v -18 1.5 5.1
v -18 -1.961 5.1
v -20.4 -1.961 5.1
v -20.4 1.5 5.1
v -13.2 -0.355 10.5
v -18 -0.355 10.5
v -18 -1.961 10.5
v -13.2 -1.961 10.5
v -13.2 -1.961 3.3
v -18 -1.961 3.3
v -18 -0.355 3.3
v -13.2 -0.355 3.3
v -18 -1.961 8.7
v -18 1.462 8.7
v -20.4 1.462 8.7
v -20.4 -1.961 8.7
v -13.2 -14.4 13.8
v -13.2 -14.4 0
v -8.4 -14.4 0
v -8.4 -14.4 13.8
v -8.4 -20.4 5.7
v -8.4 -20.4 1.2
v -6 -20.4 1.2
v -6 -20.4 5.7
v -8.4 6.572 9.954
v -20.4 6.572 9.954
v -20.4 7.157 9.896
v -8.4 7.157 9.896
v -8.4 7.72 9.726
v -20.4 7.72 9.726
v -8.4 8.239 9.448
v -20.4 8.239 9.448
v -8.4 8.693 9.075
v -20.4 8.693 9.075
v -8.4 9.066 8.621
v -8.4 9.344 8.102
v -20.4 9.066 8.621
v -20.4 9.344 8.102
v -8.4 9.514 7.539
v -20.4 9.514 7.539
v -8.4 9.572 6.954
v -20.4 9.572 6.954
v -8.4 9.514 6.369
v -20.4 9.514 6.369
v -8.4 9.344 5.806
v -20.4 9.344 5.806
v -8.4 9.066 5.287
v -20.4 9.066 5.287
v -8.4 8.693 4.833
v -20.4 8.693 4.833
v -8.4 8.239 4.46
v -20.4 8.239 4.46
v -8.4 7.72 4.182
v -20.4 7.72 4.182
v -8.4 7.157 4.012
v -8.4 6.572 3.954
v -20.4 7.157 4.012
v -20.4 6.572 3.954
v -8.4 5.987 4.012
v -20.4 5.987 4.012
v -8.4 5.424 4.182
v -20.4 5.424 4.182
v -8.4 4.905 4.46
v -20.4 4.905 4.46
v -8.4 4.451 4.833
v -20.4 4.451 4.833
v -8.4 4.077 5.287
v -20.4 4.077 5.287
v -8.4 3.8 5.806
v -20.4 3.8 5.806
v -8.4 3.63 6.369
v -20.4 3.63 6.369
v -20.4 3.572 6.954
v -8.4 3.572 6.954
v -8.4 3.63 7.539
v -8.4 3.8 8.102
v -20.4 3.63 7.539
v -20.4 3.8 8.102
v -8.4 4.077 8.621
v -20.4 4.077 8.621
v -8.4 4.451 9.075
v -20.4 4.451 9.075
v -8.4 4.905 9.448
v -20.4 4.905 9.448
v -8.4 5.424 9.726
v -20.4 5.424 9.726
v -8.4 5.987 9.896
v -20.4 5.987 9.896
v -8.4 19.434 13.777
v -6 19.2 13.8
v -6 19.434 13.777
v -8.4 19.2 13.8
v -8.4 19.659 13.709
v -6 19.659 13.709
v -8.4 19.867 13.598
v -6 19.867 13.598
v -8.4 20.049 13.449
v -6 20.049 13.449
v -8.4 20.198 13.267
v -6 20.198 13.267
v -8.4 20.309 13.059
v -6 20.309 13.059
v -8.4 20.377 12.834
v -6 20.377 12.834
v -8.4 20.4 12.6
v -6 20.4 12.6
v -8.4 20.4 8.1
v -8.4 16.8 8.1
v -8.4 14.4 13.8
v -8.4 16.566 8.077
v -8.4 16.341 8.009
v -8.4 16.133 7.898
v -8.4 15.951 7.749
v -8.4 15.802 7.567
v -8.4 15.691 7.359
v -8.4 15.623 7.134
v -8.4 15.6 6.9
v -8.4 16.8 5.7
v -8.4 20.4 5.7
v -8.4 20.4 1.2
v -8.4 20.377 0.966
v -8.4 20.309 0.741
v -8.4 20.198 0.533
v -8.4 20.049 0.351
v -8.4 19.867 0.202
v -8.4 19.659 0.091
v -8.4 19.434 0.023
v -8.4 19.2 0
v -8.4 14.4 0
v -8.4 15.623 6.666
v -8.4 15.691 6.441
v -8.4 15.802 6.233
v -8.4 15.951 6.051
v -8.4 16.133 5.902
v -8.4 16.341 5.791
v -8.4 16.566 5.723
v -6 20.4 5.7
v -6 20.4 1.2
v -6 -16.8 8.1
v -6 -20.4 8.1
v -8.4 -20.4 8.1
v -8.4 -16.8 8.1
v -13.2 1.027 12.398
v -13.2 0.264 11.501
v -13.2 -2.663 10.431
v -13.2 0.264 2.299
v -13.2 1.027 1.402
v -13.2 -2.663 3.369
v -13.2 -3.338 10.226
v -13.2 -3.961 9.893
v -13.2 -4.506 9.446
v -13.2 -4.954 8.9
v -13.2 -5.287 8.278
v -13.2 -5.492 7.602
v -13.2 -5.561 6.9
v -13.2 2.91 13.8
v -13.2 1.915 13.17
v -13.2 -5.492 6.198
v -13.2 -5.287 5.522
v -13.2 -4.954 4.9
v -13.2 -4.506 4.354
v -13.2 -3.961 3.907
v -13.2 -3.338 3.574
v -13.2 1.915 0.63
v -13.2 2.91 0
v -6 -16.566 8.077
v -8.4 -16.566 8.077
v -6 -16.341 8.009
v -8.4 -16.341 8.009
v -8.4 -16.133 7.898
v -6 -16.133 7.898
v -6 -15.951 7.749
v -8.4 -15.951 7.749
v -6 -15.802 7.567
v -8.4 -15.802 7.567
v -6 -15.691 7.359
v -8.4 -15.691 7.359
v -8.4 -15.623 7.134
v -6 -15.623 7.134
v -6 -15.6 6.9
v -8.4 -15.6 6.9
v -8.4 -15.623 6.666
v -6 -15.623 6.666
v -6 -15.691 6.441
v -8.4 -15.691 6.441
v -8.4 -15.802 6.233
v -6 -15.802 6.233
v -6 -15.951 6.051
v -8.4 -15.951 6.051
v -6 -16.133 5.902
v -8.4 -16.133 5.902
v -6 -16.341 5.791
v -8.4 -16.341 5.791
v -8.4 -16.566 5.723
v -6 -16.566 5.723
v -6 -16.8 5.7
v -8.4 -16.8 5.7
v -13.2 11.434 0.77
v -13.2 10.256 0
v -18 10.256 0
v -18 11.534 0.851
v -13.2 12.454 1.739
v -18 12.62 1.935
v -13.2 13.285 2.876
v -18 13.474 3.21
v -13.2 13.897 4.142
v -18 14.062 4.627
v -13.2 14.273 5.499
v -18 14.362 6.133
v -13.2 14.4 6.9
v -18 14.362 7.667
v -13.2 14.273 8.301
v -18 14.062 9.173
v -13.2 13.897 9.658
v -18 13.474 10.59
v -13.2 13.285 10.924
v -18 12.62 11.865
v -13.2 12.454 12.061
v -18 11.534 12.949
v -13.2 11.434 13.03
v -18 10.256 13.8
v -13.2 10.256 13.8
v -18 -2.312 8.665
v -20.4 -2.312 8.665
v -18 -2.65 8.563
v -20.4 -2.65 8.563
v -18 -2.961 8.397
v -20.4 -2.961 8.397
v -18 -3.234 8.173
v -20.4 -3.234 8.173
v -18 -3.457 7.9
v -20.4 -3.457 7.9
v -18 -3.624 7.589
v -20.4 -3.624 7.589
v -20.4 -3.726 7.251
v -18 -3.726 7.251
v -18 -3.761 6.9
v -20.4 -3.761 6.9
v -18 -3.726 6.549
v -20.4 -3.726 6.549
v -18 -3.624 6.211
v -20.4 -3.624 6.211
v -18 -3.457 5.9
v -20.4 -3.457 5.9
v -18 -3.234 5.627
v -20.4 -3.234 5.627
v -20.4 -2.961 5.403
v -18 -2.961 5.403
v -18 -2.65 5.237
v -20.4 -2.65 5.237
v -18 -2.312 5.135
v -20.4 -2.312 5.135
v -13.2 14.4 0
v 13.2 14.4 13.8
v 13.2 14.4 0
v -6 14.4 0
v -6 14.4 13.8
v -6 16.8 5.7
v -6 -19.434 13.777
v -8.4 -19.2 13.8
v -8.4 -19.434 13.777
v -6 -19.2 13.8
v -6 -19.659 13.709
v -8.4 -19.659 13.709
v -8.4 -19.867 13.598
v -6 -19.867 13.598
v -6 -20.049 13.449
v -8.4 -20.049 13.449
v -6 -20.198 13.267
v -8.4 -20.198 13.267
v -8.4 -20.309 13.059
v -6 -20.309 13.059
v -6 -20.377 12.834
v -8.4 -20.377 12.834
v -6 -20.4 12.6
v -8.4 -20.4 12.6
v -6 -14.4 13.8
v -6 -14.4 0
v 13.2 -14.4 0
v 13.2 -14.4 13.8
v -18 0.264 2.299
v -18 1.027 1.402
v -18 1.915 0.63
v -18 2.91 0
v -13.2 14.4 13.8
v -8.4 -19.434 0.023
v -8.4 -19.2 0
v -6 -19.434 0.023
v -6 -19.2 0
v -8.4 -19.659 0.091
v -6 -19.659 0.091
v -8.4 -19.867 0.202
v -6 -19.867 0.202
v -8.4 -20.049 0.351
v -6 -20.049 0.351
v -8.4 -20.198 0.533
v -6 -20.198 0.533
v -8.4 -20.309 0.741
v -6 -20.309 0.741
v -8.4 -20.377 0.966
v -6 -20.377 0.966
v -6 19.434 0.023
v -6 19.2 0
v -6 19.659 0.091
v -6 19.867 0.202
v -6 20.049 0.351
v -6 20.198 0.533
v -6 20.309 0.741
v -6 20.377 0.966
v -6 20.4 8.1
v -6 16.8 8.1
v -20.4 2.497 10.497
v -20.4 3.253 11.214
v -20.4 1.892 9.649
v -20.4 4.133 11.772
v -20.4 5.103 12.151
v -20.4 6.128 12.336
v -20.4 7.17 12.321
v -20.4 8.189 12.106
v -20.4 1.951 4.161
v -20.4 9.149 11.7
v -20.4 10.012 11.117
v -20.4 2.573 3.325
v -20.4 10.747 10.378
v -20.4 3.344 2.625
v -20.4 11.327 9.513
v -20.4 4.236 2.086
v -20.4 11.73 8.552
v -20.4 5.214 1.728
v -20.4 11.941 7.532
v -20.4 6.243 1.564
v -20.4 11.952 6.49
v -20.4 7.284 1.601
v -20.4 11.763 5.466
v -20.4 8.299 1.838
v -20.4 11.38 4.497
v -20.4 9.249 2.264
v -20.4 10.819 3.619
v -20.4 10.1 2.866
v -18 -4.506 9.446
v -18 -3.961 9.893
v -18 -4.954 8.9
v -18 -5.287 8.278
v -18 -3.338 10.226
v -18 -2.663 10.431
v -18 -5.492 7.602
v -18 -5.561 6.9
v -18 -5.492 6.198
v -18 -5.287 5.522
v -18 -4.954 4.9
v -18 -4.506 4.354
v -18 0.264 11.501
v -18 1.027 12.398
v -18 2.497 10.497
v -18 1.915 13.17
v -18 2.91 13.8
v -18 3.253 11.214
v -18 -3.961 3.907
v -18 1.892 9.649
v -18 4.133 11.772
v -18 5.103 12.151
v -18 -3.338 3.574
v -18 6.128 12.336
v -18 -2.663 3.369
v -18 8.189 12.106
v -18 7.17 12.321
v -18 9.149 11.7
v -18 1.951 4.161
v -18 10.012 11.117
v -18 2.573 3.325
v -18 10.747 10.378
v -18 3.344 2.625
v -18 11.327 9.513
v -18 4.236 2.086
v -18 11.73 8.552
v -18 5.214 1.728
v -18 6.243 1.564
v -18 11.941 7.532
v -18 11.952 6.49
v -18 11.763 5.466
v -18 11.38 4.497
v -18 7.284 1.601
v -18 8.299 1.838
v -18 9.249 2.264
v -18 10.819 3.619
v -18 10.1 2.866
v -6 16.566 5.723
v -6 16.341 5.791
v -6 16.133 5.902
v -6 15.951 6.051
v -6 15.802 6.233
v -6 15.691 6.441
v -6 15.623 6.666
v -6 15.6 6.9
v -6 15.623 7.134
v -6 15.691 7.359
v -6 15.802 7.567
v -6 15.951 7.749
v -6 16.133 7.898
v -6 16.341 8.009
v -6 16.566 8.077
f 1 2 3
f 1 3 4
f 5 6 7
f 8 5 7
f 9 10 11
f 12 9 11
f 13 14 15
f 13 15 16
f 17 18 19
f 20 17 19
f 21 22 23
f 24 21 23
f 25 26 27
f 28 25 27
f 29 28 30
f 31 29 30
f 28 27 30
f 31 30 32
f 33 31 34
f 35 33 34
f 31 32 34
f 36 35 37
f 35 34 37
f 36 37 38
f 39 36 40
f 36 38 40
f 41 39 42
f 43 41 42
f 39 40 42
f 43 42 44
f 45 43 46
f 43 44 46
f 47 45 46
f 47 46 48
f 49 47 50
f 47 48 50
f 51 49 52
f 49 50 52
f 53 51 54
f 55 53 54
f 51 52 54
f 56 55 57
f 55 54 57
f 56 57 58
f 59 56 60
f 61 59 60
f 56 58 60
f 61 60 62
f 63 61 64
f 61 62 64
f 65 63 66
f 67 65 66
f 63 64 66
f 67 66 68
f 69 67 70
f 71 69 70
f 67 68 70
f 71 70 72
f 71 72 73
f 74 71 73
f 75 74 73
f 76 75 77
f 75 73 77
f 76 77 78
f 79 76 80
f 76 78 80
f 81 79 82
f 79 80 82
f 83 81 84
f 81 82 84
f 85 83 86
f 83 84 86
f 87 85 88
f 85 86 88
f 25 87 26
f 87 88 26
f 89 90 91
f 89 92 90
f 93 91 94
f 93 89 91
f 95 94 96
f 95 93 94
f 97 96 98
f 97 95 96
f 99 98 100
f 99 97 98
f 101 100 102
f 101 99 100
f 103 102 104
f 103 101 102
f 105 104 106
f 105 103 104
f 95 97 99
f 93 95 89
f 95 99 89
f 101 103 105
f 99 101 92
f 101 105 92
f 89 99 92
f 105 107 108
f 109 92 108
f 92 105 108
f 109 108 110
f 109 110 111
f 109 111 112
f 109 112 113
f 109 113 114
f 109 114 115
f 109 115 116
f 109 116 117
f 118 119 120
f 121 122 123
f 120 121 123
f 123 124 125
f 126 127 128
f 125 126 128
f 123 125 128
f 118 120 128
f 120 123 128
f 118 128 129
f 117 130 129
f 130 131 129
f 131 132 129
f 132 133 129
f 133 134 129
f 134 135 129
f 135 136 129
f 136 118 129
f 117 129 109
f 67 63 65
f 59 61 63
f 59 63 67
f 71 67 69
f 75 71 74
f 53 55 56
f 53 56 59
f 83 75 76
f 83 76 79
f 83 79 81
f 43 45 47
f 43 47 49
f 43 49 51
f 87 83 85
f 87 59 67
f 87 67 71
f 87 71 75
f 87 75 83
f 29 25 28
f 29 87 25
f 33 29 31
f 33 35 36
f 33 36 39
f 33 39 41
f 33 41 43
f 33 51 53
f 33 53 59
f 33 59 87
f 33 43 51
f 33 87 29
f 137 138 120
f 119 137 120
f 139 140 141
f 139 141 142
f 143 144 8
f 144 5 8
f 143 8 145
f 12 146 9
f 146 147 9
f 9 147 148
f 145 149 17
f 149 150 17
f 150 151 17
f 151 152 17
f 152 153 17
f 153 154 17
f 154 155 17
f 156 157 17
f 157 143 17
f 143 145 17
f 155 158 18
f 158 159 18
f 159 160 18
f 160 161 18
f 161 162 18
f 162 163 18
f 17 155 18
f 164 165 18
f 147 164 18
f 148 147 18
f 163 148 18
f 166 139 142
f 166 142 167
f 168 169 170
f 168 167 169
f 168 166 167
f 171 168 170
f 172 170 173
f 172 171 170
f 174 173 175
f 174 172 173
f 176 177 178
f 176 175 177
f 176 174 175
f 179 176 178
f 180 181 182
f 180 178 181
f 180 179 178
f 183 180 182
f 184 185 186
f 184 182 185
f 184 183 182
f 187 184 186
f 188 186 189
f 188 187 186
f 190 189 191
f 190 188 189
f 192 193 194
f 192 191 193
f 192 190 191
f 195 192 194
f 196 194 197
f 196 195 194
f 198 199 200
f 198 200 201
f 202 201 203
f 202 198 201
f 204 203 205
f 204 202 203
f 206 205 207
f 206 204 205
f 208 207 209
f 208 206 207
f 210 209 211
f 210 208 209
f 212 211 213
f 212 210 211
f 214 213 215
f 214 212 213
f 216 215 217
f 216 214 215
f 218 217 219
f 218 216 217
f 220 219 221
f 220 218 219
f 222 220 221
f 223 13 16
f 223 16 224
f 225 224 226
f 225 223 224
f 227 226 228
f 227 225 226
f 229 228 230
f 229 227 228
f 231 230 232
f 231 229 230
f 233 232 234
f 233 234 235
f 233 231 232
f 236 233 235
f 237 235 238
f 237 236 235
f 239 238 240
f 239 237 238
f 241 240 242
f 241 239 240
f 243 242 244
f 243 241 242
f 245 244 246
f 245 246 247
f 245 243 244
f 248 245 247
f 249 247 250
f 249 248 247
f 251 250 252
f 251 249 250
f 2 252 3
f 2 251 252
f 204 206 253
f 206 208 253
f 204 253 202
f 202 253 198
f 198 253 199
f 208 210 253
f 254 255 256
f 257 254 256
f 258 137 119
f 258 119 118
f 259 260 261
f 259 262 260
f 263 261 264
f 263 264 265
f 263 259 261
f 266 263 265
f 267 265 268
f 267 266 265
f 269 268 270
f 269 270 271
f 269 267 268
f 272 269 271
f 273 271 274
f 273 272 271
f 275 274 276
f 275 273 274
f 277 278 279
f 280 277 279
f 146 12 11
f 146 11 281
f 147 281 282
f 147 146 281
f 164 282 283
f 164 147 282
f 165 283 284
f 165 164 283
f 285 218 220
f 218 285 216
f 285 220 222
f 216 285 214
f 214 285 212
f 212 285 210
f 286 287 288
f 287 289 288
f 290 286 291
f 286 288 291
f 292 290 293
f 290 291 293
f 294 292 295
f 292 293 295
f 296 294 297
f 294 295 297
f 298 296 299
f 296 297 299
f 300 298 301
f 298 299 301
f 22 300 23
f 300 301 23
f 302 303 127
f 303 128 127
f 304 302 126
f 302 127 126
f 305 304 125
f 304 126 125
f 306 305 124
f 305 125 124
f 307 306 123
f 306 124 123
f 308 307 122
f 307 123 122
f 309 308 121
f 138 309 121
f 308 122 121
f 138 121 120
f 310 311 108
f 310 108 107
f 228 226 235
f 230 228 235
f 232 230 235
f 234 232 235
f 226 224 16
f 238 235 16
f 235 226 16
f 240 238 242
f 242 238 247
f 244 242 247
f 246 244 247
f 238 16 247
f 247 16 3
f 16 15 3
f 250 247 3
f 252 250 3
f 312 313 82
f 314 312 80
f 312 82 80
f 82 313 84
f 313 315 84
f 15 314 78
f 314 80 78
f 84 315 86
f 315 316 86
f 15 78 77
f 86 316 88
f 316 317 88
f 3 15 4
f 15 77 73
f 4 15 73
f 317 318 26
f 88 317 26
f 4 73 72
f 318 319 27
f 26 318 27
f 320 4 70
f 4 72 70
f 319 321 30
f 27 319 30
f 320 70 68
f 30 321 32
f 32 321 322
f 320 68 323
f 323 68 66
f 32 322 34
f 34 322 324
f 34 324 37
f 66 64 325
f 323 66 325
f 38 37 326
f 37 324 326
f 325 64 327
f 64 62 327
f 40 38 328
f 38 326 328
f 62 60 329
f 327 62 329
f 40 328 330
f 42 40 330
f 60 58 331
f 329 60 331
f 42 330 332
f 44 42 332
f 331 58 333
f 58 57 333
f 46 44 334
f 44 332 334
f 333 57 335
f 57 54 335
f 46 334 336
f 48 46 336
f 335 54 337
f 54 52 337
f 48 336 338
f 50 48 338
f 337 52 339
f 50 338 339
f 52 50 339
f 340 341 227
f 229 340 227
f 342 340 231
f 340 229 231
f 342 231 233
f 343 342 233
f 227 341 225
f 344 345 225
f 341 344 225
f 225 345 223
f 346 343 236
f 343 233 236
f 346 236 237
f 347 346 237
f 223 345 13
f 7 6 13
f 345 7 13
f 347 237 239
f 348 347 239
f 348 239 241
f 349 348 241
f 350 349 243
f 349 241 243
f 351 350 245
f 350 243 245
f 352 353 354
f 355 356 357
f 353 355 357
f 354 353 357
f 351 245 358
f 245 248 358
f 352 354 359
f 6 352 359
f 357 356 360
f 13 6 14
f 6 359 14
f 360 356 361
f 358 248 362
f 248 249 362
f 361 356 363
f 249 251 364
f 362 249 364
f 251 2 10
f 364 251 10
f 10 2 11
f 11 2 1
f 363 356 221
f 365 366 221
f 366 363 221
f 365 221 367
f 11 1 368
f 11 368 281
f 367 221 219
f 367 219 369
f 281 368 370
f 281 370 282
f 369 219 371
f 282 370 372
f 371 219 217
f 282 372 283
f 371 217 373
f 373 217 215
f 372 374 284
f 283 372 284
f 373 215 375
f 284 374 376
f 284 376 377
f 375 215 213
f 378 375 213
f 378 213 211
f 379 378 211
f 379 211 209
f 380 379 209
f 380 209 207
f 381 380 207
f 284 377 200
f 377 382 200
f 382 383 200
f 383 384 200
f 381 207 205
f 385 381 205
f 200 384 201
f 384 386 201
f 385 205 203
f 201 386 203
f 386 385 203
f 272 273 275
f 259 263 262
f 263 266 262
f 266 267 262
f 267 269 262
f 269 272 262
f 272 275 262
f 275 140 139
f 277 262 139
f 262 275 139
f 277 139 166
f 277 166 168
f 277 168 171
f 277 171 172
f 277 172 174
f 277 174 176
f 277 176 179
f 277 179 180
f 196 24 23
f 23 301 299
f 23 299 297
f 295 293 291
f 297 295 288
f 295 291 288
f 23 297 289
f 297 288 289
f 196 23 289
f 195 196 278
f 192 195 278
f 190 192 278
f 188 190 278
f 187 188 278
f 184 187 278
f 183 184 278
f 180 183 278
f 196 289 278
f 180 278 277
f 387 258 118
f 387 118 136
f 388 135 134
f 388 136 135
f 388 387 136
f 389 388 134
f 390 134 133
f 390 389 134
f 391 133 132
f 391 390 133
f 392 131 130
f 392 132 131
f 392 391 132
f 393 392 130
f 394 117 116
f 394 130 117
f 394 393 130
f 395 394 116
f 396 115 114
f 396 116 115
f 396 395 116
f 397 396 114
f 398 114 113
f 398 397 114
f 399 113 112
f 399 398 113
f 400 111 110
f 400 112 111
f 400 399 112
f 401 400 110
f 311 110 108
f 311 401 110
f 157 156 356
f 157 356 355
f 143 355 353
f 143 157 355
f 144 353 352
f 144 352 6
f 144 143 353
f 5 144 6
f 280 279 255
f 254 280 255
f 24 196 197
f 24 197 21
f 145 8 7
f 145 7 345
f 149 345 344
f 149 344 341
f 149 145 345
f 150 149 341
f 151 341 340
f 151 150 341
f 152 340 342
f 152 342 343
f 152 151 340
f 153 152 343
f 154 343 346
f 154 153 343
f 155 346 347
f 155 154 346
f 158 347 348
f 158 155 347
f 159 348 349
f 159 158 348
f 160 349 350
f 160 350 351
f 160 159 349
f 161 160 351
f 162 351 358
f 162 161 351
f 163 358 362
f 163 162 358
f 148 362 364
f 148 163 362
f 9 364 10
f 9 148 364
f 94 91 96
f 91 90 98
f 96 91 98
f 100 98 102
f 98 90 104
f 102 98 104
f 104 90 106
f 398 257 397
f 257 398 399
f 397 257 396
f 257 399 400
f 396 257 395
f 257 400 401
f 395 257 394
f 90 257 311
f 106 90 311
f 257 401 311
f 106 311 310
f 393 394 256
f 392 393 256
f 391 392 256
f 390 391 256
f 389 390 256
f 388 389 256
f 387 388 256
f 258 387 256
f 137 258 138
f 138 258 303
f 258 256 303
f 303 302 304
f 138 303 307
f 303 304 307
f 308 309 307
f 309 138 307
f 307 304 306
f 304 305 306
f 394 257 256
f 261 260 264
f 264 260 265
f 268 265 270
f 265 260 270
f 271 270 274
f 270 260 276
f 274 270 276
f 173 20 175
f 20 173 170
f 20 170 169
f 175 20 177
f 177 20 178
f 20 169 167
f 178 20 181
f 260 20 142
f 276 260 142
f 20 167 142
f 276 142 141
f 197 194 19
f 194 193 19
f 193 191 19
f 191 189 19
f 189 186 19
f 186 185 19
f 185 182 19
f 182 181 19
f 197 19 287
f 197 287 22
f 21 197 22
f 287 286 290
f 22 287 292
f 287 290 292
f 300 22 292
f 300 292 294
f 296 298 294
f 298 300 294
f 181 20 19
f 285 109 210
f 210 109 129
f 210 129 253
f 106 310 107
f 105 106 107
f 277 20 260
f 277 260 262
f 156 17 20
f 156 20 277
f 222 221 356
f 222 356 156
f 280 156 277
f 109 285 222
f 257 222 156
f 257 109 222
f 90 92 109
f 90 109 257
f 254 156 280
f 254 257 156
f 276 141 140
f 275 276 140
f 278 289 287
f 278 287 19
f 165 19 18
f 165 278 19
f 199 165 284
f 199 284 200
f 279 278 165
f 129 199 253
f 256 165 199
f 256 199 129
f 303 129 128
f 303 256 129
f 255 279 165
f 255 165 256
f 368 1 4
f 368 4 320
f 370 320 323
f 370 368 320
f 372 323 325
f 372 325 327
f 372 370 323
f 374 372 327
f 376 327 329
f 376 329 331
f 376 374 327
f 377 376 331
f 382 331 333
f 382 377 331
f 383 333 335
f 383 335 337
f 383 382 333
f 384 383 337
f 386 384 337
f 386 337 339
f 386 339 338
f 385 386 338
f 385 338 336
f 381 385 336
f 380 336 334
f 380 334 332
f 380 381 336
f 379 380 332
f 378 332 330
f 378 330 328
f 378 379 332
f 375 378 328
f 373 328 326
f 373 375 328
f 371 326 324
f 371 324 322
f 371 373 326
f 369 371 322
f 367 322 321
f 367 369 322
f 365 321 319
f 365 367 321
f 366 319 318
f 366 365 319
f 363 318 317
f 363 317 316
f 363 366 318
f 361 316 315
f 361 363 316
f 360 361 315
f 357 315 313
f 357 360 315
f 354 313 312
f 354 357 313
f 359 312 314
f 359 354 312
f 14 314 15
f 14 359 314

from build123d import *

# Parameters (mm, degrees)
BOSS_EXTRU_2_DEPTH           = 13.8
ENL_V_MAT_EXTRU_1_DEPTH      = 33.759120867
ENL_V_MAT_EXTRU_1_DEPTH_BACK = 13.8
CONG_1_R                     = 1.2
ENL_V_MAT_EXTRU_4_DEPTH      = 33.759120867
ENL_V_MAT_EXTRU_4_DEPTH_BACK = 13.8
CONG_2_R                     = 1.2
BOSS_EXTRU_4_DEPTH           = 4.8
BOSS_EXTRU_5_DEPTH           = 2.4
ESQUISSE8_R                  = 3
ENL_V_MAT_EXTRU_5_DEPTH      = 12


with BuildPart() as part:
    # Esquisse1 → Boss.-Extru.2 (new body)
    with BuildSketch(Plane.XY):
        Polygon((-8.4, 14.4), (-13.2, 14.4), (-13.2, -14.4), (-8.4, -14.4), (-8.4, -20.4), (-6, -20.4), (-6, -14.4), (13.2, -14.4), (13.2, 14.4), (-6, 14.4), (-6, 20.4), (-8.4, 20.4), align=None)
    extrude(amount=BOSS_EXTRU_2_DEPTH)

    # Esquisse3 → Enlèv. mat.-Extru.1 (cut, two sides: drawn at the far end of the back side and taken through both)
    with BuildSketch(Plane.ZY.offset(8.4).offset(-ENL_V_MAT_EXTRU_1_DEPTH_BACK)):
        with BuildLine():
            Line((5.7, 113.592547743), (5.7, 20.4))
            Line((5.7, 20.4), (5.7, 16.8))
            ThreePointArc((5.7, 16.8), (6.9, 15.6), (8.1, 16.8))
            Line((8.1, 16.8), (8.1, 20.4))
            Line((8.1, 20.4), (8.1, 113.592547743))
            Line((8.1, 113.592547743), (8.1, 299.97764323))
            Line((8.1, 299.97764323), (5.7, 299.97764323))
            Line((5.7, 299.97764323), (5.7, 113.592547743))
        make_face()
    extrude(amount=ENL_V_MAT_EXTRU_1_DEPTH + ENL_V_MAT_EXTRU_1_DEPTH_BACK, mode=Mode.SUBTRACT)

    # Congé1
    cong_1_edges = [part.edges().sort_by_distance(p)[0] for p in [
        (-7.2, 20.4, 0),
        (-7.2, 20.4, 13.8),
    ]]
    fillet(cong_1_edges, radius=CONG_1_R)

    # Esquisse5 → Enlèv. mat.-Extru.4 (cut, two sides: drawn at the far end of the back side and taken through both)
    with BuildSketch(Plane.ZY.offset(8.4).offset(-ENL_V_MAT_EXTRU_4_DEPTH_BACK)):
        with BuildLine():
            Line((5.7, -16.8), (5.7, -20.4))
            Line((5.7, -20.4), (8.1, -20.4))
            Line((8.1, -20.4), (8.1, -16.8))
            ThreePointArc((8.1, -16.8), (6.9, -15.6), (5.7, -16.8))
        make_face()
    extrude(amount=ENL_V_MAT_EXTRU_4_DEPTH + ENL_V_MAT_EXTRU_4_DEPTH_BACK, mode=Mode.SUBTRACT)

    # Congé2
    cong_2_edges = [part.edges().sort_by_distance(p)[0] for p in [
        (-7.2, -20.4, 0),
        (-7.2, -20.4, 13.8),
    ]]
    fillet(cong_2_edges, radius=CONG_2_R)

    # Esquisse6 → Boss.-Extru.4 (add)
    with BuildSketch(Plane.ZY.offset(13.2)):
        with BuildLine():
            Line((3.3, -1.960815773), (3.3, -0.355303277))
            ThreePointArc((3.3, -0.355303277), (1.40200229, 1.026689827), (0, 2.909955561))
            Line((0, 2.909955561), (0, 10.256412893))
            ThreePointArc((0, 10.256412893), (6.9, 14.4), (13.8, 10.256412893))
            Line((13.8, 10.256412893), (13.8, 2.909955561))
            ThreePointArc((13.8, 2.909955561), (12.39799771, 1.026689827), (10.5, -0.355303277))
            Line((10.5, -0.355303277), (10.5, -1.960815773))
            ThreePointArc((10.5, -1.960815773), (6.9, -5.560815773), (3.3, -1.960815773))
        make_face()
    extrude(amount=BOSS_EXTRU_4_DEPTH)

    # Esquisse7 → Boss.-Extru.5 (add)
    with BuildSketch(Plane.ZY.offset(18)):
        with BuildLine():
            Line((5.1, -1.960815773), (5.1, 1.500148416))
            ThreePointArc((5.1, 1.500148416), (7.011460398, 11.971564485), (8.7, 1.461898964))
            Line((8.7, 1.461898964), (8.7, -1.960815773))
            ThreePointArc((8.7, -1.960815773), (6.9, -3.760815773), (5.1, -1.960815773))
        make_face()
    extrude(amount=BOSS_EXTRU_5_DEPTH)

    # Esquisse8 → Enlèv. mat.-Extru.5 (cut)
    with BuildSketch(Plane.ZY.offset(20.4)):
        with Locations((6.954089459, 6.571869256)):
            Circle(ESQUISSE8_R)
    extrude(amount=-ENL_V_MAT_EXTRU_5_DEPTH, mode=Mode.SUBTRACT)


solid = part.part
